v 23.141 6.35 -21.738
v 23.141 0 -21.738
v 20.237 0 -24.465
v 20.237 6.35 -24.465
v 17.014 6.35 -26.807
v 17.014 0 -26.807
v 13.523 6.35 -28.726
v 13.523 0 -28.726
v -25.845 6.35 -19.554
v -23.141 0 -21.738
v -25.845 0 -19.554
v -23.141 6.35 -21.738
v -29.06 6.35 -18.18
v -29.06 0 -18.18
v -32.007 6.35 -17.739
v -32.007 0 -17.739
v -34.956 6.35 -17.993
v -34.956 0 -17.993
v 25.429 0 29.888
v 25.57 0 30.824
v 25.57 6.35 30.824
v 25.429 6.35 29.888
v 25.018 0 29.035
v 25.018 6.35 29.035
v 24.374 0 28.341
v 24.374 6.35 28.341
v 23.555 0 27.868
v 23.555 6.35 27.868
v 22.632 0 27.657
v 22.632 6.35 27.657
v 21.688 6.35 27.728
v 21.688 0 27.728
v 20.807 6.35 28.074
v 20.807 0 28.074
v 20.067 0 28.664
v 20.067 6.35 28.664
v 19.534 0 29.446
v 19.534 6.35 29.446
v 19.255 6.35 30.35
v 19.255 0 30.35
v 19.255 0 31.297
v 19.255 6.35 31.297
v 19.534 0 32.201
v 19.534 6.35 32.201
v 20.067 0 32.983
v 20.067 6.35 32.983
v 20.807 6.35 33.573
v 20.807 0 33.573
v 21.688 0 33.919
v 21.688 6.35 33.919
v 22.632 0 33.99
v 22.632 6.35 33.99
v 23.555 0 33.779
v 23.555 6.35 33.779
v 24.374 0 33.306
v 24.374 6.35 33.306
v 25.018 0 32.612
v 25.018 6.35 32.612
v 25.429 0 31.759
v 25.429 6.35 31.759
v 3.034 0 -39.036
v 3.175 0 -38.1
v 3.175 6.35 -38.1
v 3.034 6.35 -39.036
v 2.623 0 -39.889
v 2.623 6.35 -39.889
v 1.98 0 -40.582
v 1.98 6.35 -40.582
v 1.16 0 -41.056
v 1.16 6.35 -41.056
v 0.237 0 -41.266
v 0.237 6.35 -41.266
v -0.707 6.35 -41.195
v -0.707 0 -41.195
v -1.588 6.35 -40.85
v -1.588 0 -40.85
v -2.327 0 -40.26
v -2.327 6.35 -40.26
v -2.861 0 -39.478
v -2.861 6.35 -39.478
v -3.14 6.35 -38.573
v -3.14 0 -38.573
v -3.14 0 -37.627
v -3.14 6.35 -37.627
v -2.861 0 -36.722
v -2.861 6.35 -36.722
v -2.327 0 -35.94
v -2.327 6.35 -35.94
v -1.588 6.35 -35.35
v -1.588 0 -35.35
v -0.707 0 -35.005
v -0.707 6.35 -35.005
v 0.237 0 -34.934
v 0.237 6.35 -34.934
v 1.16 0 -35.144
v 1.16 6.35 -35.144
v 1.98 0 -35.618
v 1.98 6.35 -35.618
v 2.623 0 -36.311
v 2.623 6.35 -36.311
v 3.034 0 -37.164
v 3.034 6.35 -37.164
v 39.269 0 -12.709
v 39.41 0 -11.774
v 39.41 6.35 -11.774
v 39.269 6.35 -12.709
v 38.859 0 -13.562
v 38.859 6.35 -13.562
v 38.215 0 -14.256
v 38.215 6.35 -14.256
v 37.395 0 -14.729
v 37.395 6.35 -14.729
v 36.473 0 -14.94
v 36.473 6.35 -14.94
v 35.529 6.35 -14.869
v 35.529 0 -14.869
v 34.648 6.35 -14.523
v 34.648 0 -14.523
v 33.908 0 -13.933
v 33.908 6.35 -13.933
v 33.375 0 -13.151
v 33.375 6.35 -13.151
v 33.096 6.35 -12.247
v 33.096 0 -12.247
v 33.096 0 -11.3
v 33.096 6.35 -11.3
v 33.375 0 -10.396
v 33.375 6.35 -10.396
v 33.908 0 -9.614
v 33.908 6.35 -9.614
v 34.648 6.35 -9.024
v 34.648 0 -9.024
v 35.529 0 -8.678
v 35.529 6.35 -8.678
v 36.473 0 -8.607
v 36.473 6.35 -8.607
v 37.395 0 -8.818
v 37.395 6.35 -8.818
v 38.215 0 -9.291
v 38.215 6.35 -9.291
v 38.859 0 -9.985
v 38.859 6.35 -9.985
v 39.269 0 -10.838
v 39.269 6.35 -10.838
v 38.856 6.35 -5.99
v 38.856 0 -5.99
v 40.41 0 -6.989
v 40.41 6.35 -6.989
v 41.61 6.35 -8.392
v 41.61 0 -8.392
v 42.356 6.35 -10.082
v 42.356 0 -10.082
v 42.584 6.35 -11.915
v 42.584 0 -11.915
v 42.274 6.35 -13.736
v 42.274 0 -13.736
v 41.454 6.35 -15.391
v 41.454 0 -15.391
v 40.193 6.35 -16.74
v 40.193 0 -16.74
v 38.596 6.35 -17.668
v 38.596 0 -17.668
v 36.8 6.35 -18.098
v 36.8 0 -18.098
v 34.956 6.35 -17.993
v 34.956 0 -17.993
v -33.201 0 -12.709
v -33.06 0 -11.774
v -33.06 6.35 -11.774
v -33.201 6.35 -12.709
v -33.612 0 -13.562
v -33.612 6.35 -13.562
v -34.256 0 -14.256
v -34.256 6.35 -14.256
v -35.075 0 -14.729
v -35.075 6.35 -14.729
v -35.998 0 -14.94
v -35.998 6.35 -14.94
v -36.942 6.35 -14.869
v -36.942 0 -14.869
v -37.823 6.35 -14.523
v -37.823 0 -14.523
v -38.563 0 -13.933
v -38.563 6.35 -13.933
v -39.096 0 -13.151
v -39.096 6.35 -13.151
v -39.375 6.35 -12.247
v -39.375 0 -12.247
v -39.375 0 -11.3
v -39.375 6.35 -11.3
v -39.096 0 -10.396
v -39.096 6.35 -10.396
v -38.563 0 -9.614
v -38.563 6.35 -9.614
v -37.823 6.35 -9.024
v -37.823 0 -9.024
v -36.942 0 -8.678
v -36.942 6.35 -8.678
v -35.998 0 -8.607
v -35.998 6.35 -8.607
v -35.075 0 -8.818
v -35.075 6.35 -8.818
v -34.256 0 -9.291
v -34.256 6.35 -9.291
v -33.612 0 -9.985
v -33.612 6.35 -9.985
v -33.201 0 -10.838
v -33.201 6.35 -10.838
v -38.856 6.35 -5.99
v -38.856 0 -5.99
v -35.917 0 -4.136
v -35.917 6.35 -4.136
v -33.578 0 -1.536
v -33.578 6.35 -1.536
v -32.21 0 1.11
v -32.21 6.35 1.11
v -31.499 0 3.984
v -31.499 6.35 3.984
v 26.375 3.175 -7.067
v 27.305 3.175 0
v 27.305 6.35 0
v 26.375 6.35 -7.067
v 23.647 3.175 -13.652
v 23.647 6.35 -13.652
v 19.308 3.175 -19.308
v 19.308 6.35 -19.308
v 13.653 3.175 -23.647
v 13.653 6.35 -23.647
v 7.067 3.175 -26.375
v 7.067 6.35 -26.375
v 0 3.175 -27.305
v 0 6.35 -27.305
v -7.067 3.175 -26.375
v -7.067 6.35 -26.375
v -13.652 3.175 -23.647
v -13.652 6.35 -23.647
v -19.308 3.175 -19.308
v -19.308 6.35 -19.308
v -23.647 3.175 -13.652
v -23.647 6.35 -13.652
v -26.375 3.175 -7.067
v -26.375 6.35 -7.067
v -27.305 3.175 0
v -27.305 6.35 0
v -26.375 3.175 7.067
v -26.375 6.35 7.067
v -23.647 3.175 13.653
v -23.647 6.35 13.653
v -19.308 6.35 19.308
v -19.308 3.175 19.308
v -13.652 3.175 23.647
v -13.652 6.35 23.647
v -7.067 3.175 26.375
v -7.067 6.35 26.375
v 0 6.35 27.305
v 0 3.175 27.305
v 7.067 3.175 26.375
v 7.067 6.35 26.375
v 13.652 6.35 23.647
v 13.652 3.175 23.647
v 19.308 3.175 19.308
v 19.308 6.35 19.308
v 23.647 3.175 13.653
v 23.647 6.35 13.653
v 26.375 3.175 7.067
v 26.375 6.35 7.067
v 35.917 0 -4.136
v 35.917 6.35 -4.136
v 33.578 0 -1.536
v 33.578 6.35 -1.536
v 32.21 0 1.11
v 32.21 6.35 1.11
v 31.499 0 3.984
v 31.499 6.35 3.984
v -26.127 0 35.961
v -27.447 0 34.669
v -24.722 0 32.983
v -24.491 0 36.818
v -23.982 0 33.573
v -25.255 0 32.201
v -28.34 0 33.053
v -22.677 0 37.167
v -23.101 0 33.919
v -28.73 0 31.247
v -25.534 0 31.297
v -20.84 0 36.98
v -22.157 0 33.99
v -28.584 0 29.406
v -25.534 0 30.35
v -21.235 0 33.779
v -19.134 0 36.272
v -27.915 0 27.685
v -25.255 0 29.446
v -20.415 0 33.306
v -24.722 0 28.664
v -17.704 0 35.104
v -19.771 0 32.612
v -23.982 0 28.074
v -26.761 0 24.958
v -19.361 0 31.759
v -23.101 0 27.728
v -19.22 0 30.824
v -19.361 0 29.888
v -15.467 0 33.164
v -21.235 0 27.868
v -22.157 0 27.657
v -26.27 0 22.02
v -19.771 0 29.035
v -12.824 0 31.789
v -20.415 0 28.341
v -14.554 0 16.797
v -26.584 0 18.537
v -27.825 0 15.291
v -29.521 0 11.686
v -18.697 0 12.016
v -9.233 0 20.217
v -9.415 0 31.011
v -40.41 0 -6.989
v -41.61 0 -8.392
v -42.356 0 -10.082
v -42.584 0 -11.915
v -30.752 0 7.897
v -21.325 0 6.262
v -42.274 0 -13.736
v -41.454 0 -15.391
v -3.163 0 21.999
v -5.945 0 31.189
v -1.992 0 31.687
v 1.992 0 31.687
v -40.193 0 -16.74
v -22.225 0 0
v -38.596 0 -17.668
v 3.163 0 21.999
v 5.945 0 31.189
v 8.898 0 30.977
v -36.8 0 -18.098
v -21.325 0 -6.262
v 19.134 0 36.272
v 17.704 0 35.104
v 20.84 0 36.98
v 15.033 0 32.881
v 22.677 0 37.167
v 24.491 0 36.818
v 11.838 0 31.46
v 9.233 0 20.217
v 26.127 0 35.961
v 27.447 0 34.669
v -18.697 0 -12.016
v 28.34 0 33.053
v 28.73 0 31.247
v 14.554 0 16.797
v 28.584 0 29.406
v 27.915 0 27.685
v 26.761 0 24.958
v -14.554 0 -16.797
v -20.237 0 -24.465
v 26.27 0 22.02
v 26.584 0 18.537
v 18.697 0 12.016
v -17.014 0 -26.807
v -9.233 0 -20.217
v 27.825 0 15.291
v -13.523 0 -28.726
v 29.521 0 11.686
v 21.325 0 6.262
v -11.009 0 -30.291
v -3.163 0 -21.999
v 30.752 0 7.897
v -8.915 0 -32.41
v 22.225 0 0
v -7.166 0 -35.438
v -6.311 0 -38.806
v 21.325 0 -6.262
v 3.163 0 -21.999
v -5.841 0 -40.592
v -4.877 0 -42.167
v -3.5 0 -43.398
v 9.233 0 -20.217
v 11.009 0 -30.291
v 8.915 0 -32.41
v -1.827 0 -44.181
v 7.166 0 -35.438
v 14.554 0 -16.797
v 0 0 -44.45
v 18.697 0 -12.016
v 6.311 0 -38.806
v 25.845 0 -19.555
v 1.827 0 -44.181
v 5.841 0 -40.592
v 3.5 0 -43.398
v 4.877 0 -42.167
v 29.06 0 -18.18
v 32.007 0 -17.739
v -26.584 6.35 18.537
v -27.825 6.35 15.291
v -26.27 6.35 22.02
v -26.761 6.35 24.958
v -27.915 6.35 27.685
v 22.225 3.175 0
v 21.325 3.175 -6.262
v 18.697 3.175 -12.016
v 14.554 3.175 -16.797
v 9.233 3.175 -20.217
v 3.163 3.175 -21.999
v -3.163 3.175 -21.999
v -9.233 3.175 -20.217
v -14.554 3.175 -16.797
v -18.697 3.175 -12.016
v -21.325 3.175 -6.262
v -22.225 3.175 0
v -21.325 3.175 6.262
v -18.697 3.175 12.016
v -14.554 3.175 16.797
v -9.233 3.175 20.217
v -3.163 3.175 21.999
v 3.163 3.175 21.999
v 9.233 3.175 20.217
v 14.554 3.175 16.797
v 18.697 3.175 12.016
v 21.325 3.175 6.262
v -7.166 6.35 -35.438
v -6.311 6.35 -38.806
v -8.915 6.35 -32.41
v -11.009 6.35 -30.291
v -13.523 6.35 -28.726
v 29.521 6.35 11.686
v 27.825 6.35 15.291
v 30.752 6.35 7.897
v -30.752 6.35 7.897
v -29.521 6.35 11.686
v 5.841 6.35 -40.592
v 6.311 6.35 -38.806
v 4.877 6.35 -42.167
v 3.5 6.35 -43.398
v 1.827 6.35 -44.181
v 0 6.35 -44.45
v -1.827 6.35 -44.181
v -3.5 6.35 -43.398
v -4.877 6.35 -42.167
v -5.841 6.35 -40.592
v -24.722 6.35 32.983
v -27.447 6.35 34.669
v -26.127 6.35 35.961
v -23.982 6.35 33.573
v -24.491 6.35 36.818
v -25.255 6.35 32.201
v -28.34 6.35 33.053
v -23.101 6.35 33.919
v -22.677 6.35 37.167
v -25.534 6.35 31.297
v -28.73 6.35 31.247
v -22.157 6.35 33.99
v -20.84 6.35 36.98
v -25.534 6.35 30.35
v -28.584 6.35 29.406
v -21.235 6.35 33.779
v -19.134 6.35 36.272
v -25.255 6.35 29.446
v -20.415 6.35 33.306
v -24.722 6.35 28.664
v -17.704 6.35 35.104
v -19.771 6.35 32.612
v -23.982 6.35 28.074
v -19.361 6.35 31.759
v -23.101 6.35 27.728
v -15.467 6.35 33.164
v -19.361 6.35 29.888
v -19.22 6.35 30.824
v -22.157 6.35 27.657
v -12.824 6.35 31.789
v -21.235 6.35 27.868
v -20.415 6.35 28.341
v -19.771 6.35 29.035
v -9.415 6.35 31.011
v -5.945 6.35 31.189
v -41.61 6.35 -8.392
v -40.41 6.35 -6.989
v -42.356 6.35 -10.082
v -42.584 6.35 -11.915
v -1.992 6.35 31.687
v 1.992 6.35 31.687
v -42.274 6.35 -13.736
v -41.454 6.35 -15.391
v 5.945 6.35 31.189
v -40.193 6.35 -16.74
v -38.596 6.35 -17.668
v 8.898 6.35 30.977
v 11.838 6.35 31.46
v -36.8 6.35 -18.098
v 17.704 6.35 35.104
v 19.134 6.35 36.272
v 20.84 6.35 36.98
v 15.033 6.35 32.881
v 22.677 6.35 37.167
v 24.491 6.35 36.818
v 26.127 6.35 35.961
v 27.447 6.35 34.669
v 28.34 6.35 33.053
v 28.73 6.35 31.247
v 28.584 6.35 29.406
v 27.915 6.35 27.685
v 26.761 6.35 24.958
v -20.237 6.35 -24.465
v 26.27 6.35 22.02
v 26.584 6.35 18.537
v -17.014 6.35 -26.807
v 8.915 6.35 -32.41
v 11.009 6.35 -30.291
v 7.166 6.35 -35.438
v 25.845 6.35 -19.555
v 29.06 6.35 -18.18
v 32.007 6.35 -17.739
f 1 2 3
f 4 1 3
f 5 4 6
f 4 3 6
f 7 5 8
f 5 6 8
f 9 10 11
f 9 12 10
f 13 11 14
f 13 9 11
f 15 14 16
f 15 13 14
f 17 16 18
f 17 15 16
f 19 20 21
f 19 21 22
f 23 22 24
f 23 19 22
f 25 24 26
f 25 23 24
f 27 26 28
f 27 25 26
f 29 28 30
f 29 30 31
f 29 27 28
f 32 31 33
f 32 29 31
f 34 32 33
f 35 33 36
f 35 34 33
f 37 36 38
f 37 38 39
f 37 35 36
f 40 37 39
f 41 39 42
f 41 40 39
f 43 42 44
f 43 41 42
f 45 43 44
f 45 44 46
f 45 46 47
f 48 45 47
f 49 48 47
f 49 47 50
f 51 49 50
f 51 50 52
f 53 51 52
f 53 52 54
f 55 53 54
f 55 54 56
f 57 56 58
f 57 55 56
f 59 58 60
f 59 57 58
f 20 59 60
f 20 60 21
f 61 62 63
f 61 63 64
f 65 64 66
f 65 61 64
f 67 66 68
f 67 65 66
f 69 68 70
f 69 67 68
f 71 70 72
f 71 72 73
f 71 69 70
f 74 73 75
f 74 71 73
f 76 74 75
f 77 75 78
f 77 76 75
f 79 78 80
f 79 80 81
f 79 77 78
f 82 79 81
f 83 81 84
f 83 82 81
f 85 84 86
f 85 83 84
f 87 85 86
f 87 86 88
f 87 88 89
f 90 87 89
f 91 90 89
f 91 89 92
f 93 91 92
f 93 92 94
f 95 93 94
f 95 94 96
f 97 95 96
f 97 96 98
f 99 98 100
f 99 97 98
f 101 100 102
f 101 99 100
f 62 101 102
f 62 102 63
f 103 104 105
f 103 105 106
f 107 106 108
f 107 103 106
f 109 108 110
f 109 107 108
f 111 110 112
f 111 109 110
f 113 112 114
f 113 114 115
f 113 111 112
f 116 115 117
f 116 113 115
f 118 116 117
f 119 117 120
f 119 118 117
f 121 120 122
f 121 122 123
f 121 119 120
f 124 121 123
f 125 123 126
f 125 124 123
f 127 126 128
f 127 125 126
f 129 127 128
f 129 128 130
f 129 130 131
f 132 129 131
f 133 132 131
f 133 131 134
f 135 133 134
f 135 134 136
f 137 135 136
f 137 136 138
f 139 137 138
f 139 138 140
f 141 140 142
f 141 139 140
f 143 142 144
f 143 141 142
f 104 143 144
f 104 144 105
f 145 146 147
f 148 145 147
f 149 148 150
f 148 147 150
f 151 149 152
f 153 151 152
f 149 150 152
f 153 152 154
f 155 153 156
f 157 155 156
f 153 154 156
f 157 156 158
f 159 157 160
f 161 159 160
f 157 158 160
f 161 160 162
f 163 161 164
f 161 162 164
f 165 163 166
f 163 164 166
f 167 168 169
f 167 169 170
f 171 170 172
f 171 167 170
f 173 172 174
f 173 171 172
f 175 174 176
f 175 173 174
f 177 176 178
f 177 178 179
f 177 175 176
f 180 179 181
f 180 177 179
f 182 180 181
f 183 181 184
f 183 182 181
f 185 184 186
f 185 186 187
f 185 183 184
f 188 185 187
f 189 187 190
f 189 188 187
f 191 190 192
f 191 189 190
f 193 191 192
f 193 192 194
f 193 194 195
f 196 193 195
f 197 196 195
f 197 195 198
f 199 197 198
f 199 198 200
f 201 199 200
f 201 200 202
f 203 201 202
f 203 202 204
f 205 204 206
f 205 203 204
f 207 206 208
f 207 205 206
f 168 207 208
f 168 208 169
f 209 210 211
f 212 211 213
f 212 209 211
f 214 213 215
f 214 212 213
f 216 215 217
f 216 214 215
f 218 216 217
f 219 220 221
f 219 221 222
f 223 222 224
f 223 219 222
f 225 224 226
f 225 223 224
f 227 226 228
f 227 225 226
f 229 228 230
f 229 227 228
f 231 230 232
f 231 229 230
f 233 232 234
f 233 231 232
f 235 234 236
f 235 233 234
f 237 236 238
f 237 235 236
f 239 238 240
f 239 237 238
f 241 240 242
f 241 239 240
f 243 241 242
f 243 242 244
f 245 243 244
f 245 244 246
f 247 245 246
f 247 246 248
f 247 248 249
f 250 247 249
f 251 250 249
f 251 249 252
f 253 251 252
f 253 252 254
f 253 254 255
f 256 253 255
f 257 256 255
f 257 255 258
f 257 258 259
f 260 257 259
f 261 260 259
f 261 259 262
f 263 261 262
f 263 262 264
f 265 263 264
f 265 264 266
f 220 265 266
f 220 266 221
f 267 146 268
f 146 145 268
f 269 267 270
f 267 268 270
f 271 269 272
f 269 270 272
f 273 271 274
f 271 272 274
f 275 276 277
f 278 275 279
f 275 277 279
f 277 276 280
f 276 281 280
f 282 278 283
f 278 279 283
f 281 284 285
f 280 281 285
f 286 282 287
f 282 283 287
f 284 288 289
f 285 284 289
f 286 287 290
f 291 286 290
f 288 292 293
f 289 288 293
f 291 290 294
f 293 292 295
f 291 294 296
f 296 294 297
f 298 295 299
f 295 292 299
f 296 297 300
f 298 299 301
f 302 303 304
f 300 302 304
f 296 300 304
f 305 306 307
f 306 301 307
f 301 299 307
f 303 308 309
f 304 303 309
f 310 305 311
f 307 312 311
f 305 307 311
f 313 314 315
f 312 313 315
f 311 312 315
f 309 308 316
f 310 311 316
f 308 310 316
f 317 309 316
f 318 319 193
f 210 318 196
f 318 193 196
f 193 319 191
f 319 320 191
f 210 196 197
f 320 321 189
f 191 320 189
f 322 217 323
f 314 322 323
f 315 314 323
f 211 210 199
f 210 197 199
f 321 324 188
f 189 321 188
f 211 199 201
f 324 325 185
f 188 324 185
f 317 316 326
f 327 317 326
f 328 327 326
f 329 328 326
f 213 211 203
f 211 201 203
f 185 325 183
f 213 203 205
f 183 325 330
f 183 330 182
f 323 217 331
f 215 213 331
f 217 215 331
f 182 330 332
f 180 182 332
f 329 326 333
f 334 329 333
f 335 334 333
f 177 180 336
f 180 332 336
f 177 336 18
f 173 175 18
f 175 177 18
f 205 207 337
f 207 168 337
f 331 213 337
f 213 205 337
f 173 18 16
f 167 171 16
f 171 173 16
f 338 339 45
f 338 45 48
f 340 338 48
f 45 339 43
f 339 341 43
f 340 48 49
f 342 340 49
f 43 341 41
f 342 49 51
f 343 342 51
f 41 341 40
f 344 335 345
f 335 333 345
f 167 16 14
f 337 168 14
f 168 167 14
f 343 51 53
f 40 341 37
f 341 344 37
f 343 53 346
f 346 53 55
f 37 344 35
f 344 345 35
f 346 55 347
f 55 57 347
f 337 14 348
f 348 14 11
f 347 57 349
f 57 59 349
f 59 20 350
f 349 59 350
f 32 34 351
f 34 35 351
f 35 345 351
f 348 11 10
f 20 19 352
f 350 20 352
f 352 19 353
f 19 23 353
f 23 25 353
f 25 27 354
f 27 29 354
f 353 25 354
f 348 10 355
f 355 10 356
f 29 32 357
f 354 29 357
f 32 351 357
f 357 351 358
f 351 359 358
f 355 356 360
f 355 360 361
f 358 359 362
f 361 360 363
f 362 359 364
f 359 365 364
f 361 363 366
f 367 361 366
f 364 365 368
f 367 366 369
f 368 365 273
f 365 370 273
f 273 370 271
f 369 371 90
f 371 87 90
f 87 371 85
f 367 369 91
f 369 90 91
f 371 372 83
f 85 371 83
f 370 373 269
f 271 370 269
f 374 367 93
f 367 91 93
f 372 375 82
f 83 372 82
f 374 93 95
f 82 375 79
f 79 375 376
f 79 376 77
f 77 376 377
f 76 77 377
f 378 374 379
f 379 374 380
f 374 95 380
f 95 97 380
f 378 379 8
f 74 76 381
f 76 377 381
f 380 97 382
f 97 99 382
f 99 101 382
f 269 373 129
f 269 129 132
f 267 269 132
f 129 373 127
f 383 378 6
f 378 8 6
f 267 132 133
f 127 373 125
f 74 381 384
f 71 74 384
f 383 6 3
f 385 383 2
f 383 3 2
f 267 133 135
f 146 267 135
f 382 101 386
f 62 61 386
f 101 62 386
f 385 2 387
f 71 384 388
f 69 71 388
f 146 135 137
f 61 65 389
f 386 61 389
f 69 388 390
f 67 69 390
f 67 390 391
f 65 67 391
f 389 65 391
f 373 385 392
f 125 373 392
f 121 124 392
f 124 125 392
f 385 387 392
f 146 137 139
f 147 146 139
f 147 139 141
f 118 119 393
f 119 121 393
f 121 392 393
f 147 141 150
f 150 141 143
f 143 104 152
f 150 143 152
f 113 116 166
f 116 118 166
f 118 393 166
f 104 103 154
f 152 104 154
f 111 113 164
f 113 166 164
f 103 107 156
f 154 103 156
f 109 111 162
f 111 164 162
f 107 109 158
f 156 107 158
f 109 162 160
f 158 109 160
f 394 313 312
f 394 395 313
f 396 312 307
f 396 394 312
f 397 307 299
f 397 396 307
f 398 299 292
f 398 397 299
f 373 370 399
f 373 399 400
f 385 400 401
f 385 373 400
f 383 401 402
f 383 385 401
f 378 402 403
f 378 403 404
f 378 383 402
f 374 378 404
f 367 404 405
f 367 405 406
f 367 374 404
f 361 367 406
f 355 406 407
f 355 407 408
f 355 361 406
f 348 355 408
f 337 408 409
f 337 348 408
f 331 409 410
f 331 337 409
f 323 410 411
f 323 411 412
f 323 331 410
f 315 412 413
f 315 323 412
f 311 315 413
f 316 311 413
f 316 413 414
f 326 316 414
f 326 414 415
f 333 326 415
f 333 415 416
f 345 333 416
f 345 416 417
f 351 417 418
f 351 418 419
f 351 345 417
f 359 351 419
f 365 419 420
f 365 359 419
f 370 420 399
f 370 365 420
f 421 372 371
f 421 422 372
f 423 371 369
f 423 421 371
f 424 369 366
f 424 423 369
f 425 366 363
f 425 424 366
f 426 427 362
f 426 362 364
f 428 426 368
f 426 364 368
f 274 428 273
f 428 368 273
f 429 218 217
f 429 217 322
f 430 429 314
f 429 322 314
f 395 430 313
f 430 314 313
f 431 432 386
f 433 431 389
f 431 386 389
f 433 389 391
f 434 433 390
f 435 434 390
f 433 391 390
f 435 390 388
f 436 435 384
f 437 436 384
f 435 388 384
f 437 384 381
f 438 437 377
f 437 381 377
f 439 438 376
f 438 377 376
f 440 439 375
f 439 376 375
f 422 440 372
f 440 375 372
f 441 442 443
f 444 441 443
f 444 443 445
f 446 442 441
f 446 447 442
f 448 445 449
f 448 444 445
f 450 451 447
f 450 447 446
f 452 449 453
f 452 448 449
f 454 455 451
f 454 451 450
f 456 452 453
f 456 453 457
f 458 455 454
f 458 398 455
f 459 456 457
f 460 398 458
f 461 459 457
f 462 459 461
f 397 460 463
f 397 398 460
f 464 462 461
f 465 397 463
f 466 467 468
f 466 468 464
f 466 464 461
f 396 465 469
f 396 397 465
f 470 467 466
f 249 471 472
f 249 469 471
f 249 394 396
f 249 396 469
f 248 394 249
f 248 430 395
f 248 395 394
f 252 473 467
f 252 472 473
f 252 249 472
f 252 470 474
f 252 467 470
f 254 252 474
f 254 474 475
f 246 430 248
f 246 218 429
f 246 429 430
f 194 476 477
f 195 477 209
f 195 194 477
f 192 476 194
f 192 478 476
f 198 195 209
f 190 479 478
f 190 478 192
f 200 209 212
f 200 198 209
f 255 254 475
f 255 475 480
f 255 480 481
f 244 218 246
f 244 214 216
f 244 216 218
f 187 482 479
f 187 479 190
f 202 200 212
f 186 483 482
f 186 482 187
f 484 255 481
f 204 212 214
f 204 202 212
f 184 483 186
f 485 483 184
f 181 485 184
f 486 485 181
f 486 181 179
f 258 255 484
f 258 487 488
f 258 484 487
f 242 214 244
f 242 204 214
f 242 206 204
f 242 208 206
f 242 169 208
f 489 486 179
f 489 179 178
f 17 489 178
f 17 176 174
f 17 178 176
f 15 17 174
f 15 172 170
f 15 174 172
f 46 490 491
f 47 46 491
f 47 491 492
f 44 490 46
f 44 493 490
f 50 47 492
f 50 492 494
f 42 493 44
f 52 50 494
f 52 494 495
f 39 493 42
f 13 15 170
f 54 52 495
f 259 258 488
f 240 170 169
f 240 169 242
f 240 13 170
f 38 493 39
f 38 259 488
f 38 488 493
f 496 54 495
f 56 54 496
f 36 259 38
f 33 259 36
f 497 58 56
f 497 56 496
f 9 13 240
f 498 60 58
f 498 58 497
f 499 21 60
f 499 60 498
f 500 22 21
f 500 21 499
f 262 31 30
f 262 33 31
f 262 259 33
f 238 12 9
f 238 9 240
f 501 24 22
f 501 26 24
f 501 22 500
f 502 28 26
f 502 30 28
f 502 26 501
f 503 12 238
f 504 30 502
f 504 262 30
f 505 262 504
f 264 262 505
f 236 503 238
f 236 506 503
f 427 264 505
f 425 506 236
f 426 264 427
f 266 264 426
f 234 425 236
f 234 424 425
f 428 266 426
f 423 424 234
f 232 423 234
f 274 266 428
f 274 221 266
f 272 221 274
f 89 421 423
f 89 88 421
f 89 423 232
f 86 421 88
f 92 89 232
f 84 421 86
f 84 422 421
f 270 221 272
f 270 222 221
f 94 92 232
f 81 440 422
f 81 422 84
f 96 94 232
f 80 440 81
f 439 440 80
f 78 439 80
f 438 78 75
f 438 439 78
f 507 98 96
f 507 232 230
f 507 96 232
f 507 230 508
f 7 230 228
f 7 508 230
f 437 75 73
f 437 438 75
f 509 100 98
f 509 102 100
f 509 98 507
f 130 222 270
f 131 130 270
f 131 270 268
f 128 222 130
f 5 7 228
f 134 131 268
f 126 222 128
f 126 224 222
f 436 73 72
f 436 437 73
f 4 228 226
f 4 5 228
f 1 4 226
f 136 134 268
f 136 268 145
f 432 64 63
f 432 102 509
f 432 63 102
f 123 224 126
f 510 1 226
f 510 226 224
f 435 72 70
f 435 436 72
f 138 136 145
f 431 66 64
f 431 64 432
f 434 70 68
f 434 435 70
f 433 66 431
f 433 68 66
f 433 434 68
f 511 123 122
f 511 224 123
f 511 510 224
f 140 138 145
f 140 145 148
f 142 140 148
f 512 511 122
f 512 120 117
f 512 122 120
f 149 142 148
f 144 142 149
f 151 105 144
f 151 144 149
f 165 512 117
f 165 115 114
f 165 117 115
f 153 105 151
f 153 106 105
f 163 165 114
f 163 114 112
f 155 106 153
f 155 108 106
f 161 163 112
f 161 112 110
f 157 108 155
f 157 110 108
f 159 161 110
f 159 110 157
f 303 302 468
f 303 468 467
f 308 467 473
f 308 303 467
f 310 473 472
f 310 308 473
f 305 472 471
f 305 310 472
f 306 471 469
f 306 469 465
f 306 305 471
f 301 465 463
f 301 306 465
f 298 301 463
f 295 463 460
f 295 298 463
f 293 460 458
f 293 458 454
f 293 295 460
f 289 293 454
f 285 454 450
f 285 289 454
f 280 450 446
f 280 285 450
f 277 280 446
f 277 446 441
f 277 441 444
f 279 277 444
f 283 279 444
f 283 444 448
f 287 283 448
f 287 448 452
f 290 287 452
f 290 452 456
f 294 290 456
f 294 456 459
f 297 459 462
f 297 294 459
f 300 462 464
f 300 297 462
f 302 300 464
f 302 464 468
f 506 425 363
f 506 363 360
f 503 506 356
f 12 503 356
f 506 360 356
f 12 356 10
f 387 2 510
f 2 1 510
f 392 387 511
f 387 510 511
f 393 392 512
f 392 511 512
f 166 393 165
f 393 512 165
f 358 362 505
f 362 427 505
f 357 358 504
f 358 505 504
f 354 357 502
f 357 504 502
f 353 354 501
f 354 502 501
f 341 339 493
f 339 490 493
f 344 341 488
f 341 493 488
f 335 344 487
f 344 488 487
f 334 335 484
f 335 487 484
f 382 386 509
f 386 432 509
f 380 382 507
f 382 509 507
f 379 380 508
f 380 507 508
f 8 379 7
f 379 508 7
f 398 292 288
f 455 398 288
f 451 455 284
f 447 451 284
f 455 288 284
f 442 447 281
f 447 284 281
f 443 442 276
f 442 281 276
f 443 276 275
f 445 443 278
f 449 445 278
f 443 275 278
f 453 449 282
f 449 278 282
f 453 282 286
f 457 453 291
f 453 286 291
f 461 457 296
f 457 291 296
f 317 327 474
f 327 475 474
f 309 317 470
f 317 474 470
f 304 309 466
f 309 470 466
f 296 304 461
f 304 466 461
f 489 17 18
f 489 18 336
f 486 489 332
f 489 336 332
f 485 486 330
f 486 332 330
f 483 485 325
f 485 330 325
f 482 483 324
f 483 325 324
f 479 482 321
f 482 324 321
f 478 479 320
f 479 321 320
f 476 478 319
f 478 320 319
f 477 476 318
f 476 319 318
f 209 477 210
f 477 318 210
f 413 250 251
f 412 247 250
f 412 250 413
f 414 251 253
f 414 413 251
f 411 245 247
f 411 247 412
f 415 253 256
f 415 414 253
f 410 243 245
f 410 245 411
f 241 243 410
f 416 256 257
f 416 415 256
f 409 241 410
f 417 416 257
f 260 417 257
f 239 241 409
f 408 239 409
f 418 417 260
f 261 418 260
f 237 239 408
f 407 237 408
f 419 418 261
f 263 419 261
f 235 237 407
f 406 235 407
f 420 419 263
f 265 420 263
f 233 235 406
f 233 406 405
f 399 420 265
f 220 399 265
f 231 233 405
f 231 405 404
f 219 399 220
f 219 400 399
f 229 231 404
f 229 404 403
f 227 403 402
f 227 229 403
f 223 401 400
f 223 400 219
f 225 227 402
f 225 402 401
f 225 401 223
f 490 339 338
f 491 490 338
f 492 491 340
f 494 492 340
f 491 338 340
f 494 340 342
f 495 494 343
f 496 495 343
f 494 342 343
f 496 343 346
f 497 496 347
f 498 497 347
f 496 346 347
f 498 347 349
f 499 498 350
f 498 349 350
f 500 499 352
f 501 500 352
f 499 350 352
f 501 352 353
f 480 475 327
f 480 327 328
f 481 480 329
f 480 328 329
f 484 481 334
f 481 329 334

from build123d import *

# Parameters (mm, degrees)
SKETCH1_R           = 3.175
SKETCH1_R_2         = 27.305
BOSS_EXTRUDE4_DEPTH = 6.35
SKETCH1_6_R         = 27.305
SKETCH1_6_R_2       = 22.225
BOSS_EXTRUDE5_DEPTH = 3.175
FILLET2_R           = 12.7


with BuildPart() as part:
    # Sketch1 → Boss-Extrude4 (new body)
    with BuildSketch(Plane(origin=(0, 0, 0), x_dir=(1, 0, 0), z_dir=(0, 1, 0))):
        with BuildLine():
            Line((6.35, 31.108519733), (6.35, 38.1))
            ThreePointArc((6.35, 38.1), (0, 44.45), (-6.35, 38.1))
            Line((-6.35, 38.1), (-6.35, 31.108519733))
            ThreePointArc((-6.35, 31.108519733), (-18.66218176, 25.686289571), (-27.62370249, 15.652270146))
            Line((-27.62370249, 15.652270146), (-34.272995357, 17.812756364))
            ThreePointArc((-34.272995357, 17.812756364), (-42.274462149, 13.7358054), (-38.197511185, 5.734338607))
            Line((-38.197511185, 5.734338607), (-31.548218319, 3.573852389))
            ThreePointArc((-31.548218319, 3.573852389), (-30.196044392, -9.811289571), (-23.422387034, -21.434884782))
            Line((-23.422387034, -21.434884782), (-27.531876027, -27.091111134))
            ThreePointArc((-27.531876027, -27.091111134), (-26.127054464, -35.9608054), (-17.257360198, -34.555983838))
            Line((-17.257360198, -34.555983838), (-13.147871206, -28.899757486))
            ThreePointArc((-13.147871206, -28.899757486), (0, -31.75), (13.147871206, -28.899757486))
            Line((13.147871206, -28.899757486), (17.257360198, -34.555983838))
            ThreePointArc((17.257360198, -34.555983838), (26.127054464, -35.9608054), (27.531876027, -27.091111134))
            Line((27.531876027, -27.091111134), (23.422387034, -21.434884782))
            ThreePointArc((23.422387034, -21.434884782), (30.196044392, -9.811289571), (31.548218319, 3.573852389))
            Line((31.548218319, 3.573852389), (38.197511185, 5.734338607))
            ThreePointArc((38.197511185, 5.734338607), (42.274462149, 13.7358054), (34.272995357, 17.812756364))
            Line((34.272995357, 17.812756364), (27.62370249, 15.652270146))
            ThreePointArc((27.62370249, 15.652270146), (18.66218176, 25.686289571), (6.35, 31.108519733))
        make_face()
        with Locations((0, 38.1)):
            Circle(SKETCH1_R, mode=Mode.SUBTRACT)
        Circle(SKETCH1_R_2, mode=Mode.SUBTRACT)
        with Locations((36.235253271, 11.773547486)):
            Circle(SKETCH1_R, mode=Mode.SUBTRACT)
        with Locations((-36.235253271, 11.773547486)):
            Circle(SKETCH1_R, mode=Mode.SUBTRACT)
        with Locations((22.394618112, -30.823547486)):
            Circle(SKETCH1_R, mode=Mode.SUBTRACT)
        with Locations((-22.394618112, -30.823547486)):
            Circle(SKETCH1_R, mode=Mode.SUBTRACT)
    extrude(amount=BOSS_EXTRUDE4_DEPTH)

    # Sketch1<6> → Boss-Extrude5 (add)
    with BuildSketch(Plane(origin=(0, 0, 0), x_dir=(1, 0, 0), z_dir=(0, 1, 0))):
        Circle(SKETCH1_6_R)
        Circle(SKETCH1_6_R_2, mode=Mode.SUBTRACT)
    extrude(amount=BOSS_EXTRUDE5_DEPTH)

    # Fillet2
    fillet2_edges = [part.edges().sort_by_distance(p)[0] for p in [
        (27.62370249, 3.175, -15.652270146),
        (31.548218319, 3.175, -3.573852389),
        (23.422387034, 3.175, 21.434884782),
        (13.147871206, 3.175, 28.899757486),
        (-13.147871206, 3.175, 28.899757486),
        (-23.422387034, 3.175, 21.434884782),
        (-31.548218319, 3.175, -3.573852389),
        (-27.62370249, 3.175, -15.652270146),
        (-6.35, 3.175, -31.108519733),
        (6.35, 3.175, -31.108519733),
    ]]
    fillet(fillet2_edges, radius=FILLET2_R)


solid = part.part
